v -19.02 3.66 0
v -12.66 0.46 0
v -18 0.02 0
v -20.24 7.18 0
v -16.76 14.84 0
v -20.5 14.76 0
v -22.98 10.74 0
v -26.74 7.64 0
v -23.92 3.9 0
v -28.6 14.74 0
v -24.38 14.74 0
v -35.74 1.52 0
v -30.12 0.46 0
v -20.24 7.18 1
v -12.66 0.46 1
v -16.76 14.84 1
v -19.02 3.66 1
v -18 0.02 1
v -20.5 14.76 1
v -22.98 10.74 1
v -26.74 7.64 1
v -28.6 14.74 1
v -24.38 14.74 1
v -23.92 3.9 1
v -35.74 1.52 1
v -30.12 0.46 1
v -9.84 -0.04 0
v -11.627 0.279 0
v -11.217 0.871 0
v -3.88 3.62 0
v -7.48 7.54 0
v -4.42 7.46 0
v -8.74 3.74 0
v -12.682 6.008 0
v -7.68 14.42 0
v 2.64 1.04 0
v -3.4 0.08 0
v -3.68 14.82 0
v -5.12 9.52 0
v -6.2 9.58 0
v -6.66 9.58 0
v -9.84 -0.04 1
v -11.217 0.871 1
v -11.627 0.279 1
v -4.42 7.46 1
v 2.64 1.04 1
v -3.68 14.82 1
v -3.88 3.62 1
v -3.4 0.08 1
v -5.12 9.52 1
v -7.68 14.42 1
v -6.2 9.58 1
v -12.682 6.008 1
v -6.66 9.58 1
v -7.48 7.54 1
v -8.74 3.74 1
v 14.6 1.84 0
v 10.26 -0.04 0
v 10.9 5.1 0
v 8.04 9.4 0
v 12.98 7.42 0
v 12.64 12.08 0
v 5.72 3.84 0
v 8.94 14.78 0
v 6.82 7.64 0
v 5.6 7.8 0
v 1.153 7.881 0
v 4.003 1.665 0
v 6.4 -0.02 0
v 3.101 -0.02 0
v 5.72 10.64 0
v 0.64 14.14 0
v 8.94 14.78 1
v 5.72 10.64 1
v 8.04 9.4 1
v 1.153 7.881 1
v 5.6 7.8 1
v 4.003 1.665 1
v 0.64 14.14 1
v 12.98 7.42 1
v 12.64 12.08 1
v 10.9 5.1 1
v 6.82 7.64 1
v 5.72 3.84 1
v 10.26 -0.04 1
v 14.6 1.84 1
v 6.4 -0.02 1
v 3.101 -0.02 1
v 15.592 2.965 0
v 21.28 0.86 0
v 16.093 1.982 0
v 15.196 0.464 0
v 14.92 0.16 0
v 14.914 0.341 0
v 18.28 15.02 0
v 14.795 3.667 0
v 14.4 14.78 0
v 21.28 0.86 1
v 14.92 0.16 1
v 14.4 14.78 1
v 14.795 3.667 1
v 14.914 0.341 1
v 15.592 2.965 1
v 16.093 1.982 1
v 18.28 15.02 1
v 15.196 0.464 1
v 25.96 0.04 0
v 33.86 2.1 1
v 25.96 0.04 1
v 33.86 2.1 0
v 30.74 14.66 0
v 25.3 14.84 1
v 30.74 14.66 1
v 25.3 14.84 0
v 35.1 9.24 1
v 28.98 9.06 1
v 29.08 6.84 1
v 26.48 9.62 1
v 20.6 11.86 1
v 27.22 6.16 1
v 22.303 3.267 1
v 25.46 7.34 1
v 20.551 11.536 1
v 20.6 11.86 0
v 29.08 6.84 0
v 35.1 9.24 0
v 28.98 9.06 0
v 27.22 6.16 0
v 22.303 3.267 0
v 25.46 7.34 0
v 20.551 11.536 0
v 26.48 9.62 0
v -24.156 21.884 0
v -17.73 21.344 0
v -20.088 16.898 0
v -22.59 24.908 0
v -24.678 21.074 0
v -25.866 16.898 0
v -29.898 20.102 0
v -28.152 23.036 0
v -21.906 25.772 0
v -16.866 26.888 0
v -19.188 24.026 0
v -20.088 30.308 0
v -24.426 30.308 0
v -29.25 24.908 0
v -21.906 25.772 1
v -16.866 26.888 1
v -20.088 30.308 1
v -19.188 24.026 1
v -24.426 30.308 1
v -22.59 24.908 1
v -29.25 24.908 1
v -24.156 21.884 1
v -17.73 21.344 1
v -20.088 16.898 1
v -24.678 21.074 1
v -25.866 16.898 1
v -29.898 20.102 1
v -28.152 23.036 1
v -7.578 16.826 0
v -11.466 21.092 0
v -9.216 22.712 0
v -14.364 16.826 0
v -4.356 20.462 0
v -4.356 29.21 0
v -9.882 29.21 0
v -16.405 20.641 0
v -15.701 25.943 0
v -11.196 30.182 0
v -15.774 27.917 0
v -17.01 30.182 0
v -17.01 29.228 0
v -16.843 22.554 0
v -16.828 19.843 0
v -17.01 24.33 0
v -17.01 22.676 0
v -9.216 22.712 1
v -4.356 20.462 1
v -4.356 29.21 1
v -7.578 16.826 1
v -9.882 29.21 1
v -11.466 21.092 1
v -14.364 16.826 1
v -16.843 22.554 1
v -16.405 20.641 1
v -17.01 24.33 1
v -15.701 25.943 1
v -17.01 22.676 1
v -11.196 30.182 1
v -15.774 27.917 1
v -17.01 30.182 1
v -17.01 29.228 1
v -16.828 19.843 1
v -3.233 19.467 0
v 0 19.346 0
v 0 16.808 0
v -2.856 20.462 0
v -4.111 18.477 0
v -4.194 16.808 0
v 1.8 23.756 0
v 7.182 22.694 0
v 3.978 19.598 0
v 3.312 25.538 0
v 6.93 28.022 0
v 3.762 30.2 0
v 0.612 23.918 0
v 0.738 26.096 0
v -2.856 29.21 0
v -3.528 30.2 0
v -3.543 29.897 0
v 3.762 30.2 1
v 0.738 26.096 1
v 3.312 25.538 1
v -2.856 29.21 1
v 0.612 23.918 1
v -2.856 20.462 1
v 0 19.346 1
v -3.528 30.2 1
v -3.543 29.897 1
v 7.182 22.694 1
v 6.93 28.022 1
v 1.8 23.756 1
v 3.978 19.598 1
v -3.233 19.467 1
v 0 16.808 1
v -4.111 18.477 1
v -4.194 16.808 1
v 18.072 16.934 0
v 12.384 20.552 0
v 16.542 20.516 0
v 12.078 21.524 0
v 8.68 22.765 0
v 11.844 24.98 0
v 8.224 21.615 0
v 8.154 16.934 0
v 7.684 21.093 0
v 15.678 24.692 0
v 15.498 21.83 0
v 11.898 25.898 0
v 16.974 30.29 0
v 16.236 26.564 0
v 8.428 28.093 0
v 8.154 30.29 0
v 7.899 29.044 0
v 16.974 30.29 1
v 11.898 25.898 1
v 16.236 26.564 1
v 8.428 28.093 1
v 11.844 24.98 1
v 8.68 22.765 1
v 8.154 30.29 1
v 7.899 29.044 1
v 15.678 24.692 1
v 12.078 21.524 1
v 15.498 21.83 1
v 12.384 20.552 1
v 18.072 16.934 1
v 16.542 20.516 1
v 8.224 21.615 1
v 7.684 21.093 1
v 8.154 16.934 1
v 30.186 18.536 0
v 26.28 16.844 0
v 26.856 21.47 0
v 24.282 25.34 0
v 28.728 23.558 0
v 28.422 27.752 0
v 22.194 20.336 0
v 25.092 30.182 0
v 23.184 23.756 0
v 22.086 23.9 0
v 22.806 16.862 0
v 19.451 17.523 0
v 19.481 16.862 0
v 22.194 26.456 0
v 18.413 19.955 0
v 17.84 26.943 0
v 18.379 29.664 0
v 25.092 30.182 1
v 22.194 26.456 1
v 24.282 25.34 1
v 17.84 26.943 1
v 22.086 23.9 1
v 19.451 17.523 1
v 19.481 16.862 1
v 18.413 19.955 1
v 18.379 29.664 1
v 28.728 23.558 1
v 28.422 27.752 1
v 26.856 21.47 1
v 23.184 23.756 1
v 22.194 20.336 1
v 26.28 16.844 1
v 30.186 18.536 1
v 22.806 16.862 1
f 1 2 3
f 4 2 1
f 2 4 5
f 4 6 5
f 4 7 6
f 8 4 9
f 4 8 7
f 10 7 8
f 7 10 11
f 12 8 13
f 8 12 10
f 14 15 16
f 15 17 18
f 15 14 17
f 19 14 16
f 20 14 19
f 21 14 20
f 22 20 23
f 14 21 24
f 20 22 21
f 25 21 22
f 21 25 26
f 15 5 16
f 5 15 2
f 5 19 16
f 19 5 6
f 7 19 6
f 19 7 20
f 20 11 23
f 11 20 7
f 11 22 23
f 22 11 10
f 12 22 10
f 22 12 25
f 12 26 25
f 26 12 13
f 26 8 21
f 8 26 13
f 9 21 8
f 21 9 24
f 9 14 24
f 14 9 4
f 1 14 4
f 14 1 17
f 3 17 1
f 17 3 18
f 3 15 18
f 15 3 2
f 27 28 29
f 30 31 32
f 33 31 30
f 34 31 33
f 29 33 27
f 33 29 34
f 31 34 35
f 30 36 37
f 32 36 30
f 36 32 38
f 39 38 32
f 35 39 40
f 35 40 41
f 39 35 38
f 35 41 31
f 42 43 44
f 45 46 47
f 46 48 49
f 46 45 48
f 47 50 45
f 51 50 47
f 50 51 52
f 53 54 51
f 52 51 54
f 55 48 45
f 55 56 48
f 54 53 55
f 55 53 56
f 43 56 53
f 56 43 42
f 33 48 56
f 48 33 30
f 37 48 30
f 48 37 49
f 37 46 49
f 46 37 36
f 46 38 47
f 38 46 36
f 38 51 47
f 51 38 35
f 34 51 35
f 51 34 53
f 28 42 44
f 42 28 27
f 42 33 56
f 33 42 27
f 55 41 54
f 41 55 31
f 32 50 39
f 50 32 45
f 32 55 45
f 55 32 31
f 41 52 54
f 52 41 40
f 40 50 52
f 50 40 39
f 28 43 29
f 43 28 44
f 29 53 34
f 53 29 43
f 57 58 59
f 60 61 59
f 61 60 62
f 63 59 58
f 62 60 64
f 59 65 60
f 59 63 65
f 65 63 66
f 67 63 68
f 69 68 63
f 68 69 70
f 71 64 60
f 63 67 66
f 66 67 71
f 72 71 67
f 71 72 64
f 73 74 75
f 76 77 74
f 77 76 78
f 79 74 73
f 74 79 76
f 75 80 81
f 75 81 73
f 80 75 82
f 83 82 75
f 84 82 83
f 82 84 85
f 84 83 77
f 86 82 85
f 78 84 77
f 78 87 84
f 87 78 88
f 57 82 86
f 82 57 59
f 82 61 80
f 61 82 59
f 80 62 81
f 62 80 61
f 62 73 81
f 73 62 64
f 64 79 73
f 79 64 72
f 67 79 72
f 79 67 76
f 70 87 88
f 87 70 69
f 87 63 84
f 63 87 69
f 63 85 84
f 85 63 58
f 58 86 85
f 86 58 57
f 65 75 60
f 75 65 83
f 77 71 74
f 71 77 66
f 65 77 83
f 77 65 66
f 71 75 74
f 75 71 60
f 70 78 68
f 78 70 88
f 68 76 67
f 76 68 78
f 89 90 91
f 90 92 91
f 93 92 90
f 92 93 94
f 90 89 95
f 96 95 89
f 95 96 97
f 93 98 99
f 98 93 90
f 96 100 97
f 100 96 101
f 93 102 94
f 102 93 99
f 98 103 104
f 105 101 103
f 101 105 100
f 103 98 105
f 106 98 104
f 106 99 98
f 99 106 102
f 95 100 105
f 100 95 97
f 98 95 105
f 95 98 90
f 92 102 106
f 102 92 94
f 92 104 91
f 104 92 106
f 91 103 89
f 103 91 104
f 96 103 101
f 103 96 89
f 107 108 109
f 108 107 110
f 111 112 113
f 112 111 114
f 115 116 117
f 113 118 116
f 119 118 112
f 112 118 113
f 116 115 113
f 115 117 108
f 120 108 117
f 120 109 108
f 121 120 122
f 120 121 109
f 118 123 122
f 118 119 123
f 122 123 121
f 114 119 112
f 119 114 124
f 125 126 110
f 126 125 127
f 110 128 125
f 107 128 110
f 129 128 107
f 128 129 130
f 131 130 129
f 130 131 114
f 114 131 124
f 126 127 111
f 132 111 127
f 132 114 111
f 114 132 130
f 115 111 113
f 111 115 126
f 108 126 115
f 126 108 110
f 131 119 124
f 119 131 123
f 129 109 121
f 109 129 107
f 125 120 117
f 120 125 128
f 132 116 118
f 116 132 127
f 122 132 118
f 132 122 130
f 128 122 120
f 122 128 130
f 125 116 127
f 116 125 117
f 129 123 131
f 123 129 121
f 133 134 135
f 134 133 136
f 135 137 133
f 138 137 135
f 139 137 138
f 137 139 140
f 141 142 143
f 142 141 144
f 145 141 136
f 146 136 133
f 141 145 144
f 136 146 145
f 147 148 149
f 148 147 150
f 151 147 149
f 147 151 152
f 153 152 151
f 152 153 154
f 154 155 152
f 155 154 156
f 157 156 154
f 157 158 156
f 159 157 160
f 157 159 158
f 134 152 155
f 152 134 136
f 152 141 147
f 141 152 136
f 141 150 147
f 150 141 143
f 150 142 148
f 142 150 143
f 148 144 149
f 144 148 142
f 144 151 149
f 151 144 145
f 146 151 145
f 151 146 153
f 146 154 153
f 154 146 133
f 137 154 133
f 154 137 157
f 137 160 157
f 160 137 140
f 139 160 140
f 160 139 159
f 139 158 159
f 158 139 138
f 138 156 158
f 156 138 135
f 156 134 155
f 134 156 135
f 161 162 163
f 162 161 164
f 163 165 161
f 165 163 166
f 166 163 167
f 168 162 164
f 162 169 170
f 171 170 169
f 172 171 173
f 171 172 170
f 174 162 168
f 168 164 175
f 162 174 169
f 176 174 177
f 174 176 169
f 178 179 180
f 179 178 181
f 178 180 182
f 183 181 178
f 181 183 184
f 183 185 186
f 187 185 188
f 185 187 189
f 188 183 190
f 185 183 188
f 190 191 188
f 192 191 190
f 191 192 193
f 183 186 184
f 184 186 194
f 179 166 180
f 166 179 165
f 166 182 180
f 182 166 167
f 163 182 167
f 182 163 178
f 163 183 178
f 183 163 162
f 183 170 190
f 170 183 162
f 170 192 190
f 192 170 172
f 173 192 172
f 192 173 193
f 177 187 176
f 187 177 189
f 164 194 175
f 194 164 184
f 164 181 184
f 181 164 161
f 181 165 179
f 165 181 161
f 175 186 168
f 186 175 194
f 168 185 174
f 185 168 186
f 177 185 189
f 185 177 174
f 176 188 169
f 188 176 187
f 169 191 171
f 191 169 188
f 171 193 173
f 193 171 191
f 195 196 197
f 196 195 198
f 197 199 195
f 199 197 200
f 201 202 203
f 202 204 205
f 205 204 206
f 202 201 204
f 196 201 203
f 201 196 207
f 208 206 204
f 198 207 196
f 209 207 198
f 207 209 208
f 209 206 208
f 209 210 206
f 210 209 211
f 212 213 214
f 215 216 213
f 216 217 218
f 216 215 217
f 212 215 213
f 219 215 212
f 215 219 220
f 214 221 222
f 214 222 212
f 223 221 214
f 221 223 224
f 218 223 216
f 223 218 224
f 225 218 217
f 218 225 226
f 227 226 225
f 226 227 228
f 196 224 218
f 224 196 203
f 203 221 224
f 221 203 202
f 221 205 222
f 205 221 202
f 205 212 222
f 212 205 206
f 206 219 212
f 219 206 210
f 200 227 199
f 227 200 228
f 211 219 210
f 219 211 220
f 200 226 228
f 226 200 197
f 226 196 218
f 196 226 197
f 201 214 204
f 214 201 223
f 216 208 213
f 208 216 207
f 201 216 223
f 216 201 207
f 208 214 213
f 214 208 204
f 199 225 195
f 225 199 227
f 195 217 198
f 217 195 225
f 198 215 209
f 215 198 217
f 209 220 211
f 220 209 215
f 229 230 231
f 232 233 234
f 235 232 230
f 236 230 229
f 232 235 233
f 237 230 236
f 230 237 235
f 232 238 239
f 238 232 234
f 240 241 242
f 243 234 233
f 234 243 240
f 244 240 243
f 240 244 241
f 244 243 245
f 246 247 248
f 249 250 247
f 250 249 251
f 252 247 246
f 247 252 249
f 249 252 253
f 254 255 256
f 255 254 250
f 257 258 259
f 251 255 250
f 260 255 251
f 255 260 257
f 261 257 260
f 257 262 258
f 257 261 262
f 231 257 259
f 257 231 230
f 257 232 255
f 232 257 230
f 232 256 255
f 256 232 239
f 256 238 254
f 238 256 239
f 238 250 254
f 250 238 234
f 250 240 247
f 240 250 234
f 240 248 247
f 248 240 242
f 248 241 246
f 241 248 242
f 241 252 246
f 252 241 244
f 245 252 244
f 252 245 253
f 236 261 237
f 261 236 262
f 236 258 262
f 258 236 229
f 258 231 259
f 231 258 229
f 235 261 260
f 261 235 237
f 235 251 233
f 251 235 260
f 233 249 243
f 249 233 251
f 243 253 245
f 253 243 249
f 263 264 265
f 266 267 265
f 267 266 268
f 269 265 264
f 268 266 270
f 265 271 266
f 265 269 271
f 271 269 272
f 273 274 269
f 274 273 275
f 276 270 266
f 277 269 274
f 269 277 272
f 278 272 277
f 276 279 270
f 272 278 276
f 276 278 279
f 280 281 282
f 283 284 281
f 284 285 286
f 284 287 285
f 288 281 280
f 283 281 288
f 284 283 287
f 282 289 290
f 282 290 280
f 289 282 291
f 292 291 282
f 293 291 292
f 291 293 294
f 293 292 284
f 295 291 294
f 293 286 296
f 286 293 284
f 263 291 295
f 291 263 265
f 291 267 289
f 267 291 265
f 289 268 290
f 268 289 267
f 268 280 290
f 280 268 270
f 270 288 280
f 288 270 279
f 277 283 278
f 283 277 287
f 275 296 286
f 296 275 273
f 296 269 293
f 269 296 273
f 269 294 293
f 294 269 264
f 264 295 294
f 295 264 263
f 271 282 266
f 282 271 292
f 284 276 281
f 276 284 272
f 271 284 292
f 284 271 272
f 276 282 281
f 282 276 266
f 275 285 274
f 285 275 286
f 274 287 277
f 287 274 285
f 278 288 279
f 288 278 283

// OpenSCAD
// Choose your custom words and write them in UPPERCASE.
// If you want only one line, you can leave the second word empty.
word1="SUPER";
word2="MARIO";

// CONSTANTS
// The following values are model constants and are not intended to be changed by the end user.
//-----------------
// [Fixed design parameters]
// Scale for Word 1
scale_word1 = 1.8;

// Scale for Word 2
scale_word2 = 2.0;
// Height scale
scale_height = 1;

// Brim radius/offset
brim_radius = 1.5;

// Gap between the two words
gap = 2;
// Spaziatura tra le lettere
spacing = 0.0;


// Small tolerance to help letters fit into the brim
wiggle=0.1;
//-----------------


// Wall thickness for hollow letters
wall_thikness_letter = 2;

//-----------------

// Path data for letters and symbols
glyph_A = [
    [449, 741], [765, 52], [463, 4], [439, 181], [196, 187], [141, -2], [-150, 50], [249, 721], [449, 741]
]/100;
glyph_B = [
    [138, 747], [485, 706], [565, 578], [559, 441], [507, 363], [580, 321], [629, 178], [573, 45], [457, 4], [21, 1], [1, 704], [138, 747]
]/100;
glyph_C = [
    [287, 744], [563, 726], [552, 461], [372, 545], [215, 472], [208, 302], [346, 208], [549, 314], [617, 35], [218, 0], [23, 171], [-35, 386], [55, 617], [287, 744]
]/100;
glyph_D = [
    [368, 744], [578, 572], [621, 171], [414, 2], [0, 2], [0, 699], [368, 744]
]/100;
glyph_E = [
    [54, 745], [544, 745], [503, 538], [262, 501], [259, 450], [472, 434], 
    [462, 275], [272, 258], [289, 204], [520, 202], [605, 3], [54, 3], 
    [0, 481], [54, 745]
]/100;
glyph_F = [
    [49, 746], [553, 742], [525, 501], [250, 532], [246, 452], [479, 464], [441, 244], [246, 269], [288, 3], [22, 3], [1, 543], [49, 746]
]/100;
glyph_G = [
    [627, 591], [456, 495], [387, 533], [285, 502], [224, 357], [288, 222], [472, 244], [476, 277], [334, 264], [352, 465], [648, 461], [648, 66], [151, 2], [0, 309], [55, 591], [267, 745], [527, 727], [627, 591]
]/100;
glyph_H = [
    [0, 698], [252, 746], [264, 441], [411, 463], [420, 732], [626, 723], [666, 5], [434, 13], [432, 238], [292, 211], [297, 5], [80, 5],
    [0, 698]
]/100;
glyph_I = [
    [5, 739], [199, 751], [349, 43], [31, 8], [5, 739]
]/100;
glyph_J = [
    [0, 739], [219, 744], [658, 724], [658, 528], [459, 509],
    [533, 162], [430, 32], [235, 0], [18, 0], [25, 220],
    [263, 237], [236, 509], [0, 528], [0, 739]
]/100;
glyph_K = [
    [14, 741], [223, 741], [218, 539], [375, 718], [518, 566],
    [337, 369], [605, 178], [440, 0], [216, 243], [257, -2],
    [0, -2], [14, 741]
]/100;
glyph_L = [
    [278, 717], [249, 269], [556, 306], [584, 75], [28, 9],
    [0, 749], [278, 717]
]/100;
glyph_M = [
    [0, 76], [357, 737], [568, 737], [638, 537], [762, 738],
    [949, 742], [1154, 23], [887, 1], [836, 183], [775, 359],
    [591, 195], [450, 382], [281, 23], [0, 76]
]/100;
glyph_N = [
    [0, 13], [133, 742], [284, 742], [425, 510], [437, 742],
    [669, 706], [620, 4], [428, 16], [280, 242], [237, 3],
    [0, 13]
]/100;
glyph_O = [
    [522, 733], [740, 462], [678, 105], [283, 2], [-32, 280],
    [15, 593], [250, 742], [522, 733]
]/100;
glyph_P = [
    [442, 740], [618, 619], [632, 323], [454, 151], [233, 137], [233, -4], [0, -4], [37, 740], [442, 740]
]/100;
glyph_Q =[
    [531, 731], [721, 478], [653, 216], [797, 84], [621, -2], [535, 61], [238, -3], [-21, 243], [26, 593], [260, 740], [531, 731]
]/100;
glyph_R = [
    [415, 739], [600, 604], [617, 371], [513, 255], [698, 92], [481, -2], [254, 192], [288, -1], [58, -1], [0, 707], [415, 739]
]/100;
glyph_S = [
    [725, 556], [596, 397], [445, 494], [407, 446], [677, 248], [546, 1], [225, 1], [1, 179], [98, 342], [291, 233],
    [320, 278], [37, 446], [305, 746], [546, 746], [725, 556]
]/100;
glyph_T = [
    [0, 742], [739, 729], [739, 429], [489, 470], [558, -1], [200, -1], [254, 470], [0, 483], [0, 742]
]/100;
glyph_U = [
    [-9, 739], [314, 739], [299, 234], [424, 324], [387, 685], [694, 685], [694, 199], [515, -3], [138, -3], [-9, 177], [-9, 739]
]/100;
glyph_V = [
    [0, 745], [259, 731], [362, 284], [401, 334], [512, 731], [799, 745], [517, 3], [169, 29], [0, 745]
]/100;
glyph_W = [
    [1028, 675], [709, 6], [523, 6], [454, 207], [352, 5], [182, 0], [0, 723], [238, 744], [283, 562], [337, 385], [502, 550], [627, 362], [778, 729], [1028, 675]
]/100;
glyph_X = [
    [200, 739], [357, 579], [473, 750], [663, 568], [525, 405], [753, 226], [563, 7], [399, 221], [191, 12], [0, 201], [221, 400], [53, 588], [200, 739]
]/100;
glyph_Y = [
    [71, 733], [236, 557], [391, 753], [610, 588], [371, 380], [548, 13], [156, 31], [156, 350], [-93, 588], [71, 733]
]/100;
glyph_Z = [
    [617, 3], [0, 28], [0, 228], [248, 486], [0, 471], [44, 748], [625, 707], [614, 517], [386, 265], [625, 300], [617, 3]
]/100;
glyph_0 = [
    [381, 732], [552, 531], [497, 90], [224, 1], [3, 223], [48, 606], [202, 742], [381, 732], [560, 732]
]/100;
glyph_1 = [
    [527, 727], [468, 205], [679, 232], [713, 1], [0, 1], [20, 218], [258, 205], [258, 476], [133, 397], [0, 578], [269, 741], [527, 741]
]/100;
glyph_2 = [
    [4, 605], [211, 742], [392, 741], [544, 629], [610, 352], [411, 221], [629, 239], [686, 1], [110, 9], [34, 156], [330, 390], [309, 454], [261, 492], [140, 409], [4, 605]
]/100;
glyph_3 = [
    [1, 607], [178, 740], [403, 708], [511, 522], [441, 421], [528, 357], [534, 131], [415, 1], [148, 26], [1, 175], [120, 291], [220, 197], [314, 222], [317, 279], [170, 329], [176, 419], [295, 498], [264, 531], [97, 454], [1, 607]
]/100;
glyph_4 = [
    [531, 409], [689, 402], [689, 223], [548, 214], [575, 31], [318, 4], [314, 214], [8, 214], [4, 400], [208, 747], [487, 728], [531, 409]
]/100;
glyph_5 = [
    [572, 741], [530, 543], [247, 546], [253, 501], [415, 495], [610, 389], [609, 166], [534, 45], [189, 10], [7, 95], [88, 248], [212, 205], [324, 200], [368, 251], [318, 298], [91, 293], [10, 433], [0, 724], [572, 741]
]/100;
glyph_6 = [
    [154, 719], [335, 746], [515, 709], [447, 499], [286, 559], [211, 500], [202, 444], [416, 438], [501, 300], [499, 120], [380, 1], [136, 1], [0, 120], [0, 371], [28, 575], [154, 719]
]/100;
glyph_7 = [
    [0, 740], [641, 726], [524, -3], [234, 66], [393, 501], [51, 473], [0, 740]
]/100;
glyph_8 = [
    [461, 716], [533, 519], [446, 450], [562, 355], [577, 61], [414, -3], [154, -3], [0, 87], [17, 351], [139, 444], [46, 519], [116, 745], [461, 716]
]/100;
glyph_9 = [
    [306, 747], [533, 593], [524, 320], [447, 127], [116, 1], [0, 161], [264, 230], [319, 327], [137, 313], [0, 463], [36, 677], [306, 747]
]/100;
glyph_at = [
    [422, 103], [606, 184], [657, 125], [441, 2], [160, 63], [3, 349], [116, 715], [381, 854], [786, 684], [869, 344], [800, 248], [744, 167], [636, 182], [594, 233], [461, 169], [234, 206], [183, 482], [323, 672], [510, 664], [596, 607], [599, 637], [670, 600], [653, 418], [677, 260], [722, 243], [783, 364], [710, 615], [385, 748], [197, 637], [119, 371], [212, 165], [422, 103]
]/100;
glyph_b_l = [
    [233, 856], [241, 782], [89, 795], [84, -15], [241, 15], [241, -83], [7, -98], [2, 866], [233, 856]
]/100;
glyph_b_r = [
    [9, -88], [1, -14], [153, -27], [158, 783], [1, 753], [1, 851], [235, 866], [240, -98], [9, -88]
]/100;
glyph_per = [
    [389, 745], [572, 774], [206, 33], [0, 4], [389, 745], [475, 293], [544, 213], [522, 35], [412, 0], [324, 88], [342, 242], [404, 297], [475, 293], [389, 745], [191, 768], [260, 687], [238, 510], [128, 474], [38, 564], [57, 717], [119, 771], [191, 768], [389, 745]
]/100;
glyph_num = [
    [395, 778], [292, 29], [156, 0], [274, 749], [395, 778],
    
    [544, 749], [665, 778], [563, 29], [426, 0], [544, 749], 
    
   [718, 601], [810, 451], [113, 429], [4, 594], [718, 601],  
    
    [733, 328], [832, 169], [135, 147], [60, 316], [733, 328], [718, 601], [544, 749], [395, 778]
]/100;
glyph_dol = [
    [664, 550], [546, 405], [431, 528], [289, 576], [254, 531], [664, 256], [500, 42], [206, 42], [1, 205], [90, 354], [259, 208], [444, 163], [471, 204], [34, 450], [279, 724], [500, 724], 
    [424, 794], [341, 795], [283, -32], [399, -20], [424, 794], [500, 724]
]/100;
glyph_asc = [
    [278, 582], [164, 765], [68, 601], [8, 638], [164, 882], [348, 593], [278, 582]
]/100;
glyph_bar = [
    [60, -121], [5, -121], [3, 853], [58, 853], [60, 974], [115, 974], [60, -121]
]/100;
glyph_ast = [
    [67, 719], [97, 720], [93, 653], [144, 696], [158, 662], [99, 638], [161, 608], [141, 585], [93, 620], [99, 558], [49, 561], [55, 620], [22, 617], [28, 676], [78, 640], [28, 699], [95, 673], [95, 730], [45, 694], [23, 722], [90, 748], [38, 784], [67, 719]
]/100;
glyph_col = [
    [92, 179], [164, 144], [172, 49], [114, 8], [50, 20], [20, 52], [10, 136], [92, 179], [97, 320], [170, 386], [167, 456], [84, 503], [16, 463], [22, 362], [97, 320]
]/100;
//glyph_scol = [
    //[72, 456], [139, 496], [220, 450], [223, 381], [154, 317], [81, 358], [89, 95], [164, 91], [142, -17], [61, -92], [11, -92], [80, 5]
//]/100;
glyph_dot = [
    [107, 173], [186, 173], [233, 91], [200, 30], [107, 9], [64, 82], [107, 173]
]/100;
glyph_sl = [
    [375, 727], [551, 755], [198, 41], [0, 13], [375, 727]
]/100;
glyph_add = [
    [222, 524], [220, 424], [323, 434], [336, 320], [220, 325], [233, 221], [125, 213], [116, 325], [15, 328], [-2, 423], [119, 423], [108, 529], [222, 524]
]/100;
glyph_com = [
    [58, 81], [138, 76], [114, -39], [28, -119], [-25, -119], [48, -15], [58, 81]
]/100;
glyph_dif = [
    [6, 342], [1, 431], [325, 471], [341, 354], [6, 342]
]/100;
glyph_equ = [
    [5, 299], [0, 353], [305, 377], [320, 307], [5, 299], [5, 435], [0, 488], [305, 512], [320, 442], [5, 435]
]/100;
glyph_que = [
    [242, 144], [298, 68], [263, 3], [174, 0], [138, 54], [162, 140], [242, 144],
    [256, 465], [284, 573], [226, 609], [138, 528], [0, 671], [131, 779], [308, 779], [437, 623], [432, 424], [293, 330], [308, 190], [126, 190], [105, 345], [256, 465], [242, 144]
]/100;
glyph_exc = [
    [213, 219], [93, 210], [0, 768], [197, 796], [213, 219],[71, 78], [106, 144], [197, 148], [233, 92], [209, 4], [128, 1], [71, 78]
]/100;
glyph_les = [
    [37, 785], [91, 776], [91, 665], [38, 593], [-3, 609], [38, 691], [205, 776], [205, 665], [152, 593], [99, 609], [140, 691], [139, 785],
    [205, 776], [205, 665], [152, 593], [99, 609], [140, 691], [139, 785]
]/100;
glyph_pr = [
    [0, 785], [71, 785], [175, 658], [251, 402], [240, 130], [200, 2], [80, -100], [33, -80], [120, 41], [150, 268], [119, 498], [0, 785]
]/100;
glyph_pl = [
    [250, 780], [132, 622], [67, 392], [92, 166], [218, -62], [130, -62], [80, 40], [20, 194], [0, 465], [76, 721], [120, 800], [220, 860], [354, 890], [354, 800]
]/100;
glyph_uns = [
    [0, -28], [0, 27], [728, 27], [728, -28], [0, -28]
]/100;
glyph_qus = [
    [37, 785], [91, 776], [91, 665], [38, 593], [-3, 609], [38, 691], [37, 785]
]/100;
// Path data for the holes in the letters and symbols
hole_A = [
    [300, 479], [259, 377], [412, 373], [377, 476], [323, 479]
]/100;
hole_B = [
    [257, 152], [359, 174], [359, 242], [257, 277], [257, 152], [244, 462], [345, 483], [345, 565], [244, 587], [244, 462]
]/100;
hole_D = [
    [229, 477], [229, 259], [364, 306], [364, 415], [229, 477]
]/100;
hole_O = [
    [309, 481], [258, 367], [346, 308], [439, 342], [434, 453], [309, 481]
]/100;
hole_P = [
    [274, 512], [267, 391], [333, 382], [417, 481], [274, 512]
]/100;
hole_Q = [
    [228, 477], [221, 272], [385, 223], [294, 313], [426, 409], [505, 336], [532, 388], [432, 523], [228, 477]
]/100;
hole_R = [
    [254, 532], [248, 390], [309, 382], [370, 470], [254, 532]
]/100;
hole_0 = [
    [257, 488], [235, 324], [279, 287], [327, 321], [318, 462], [257, 462]

]/100;
hole_4 = [
    [216, 409], [305, 409], [297, 513], [216, 409]
]/100;
hole_6 = [
    [258, 267], [211, 244], [213, 185], [292, 185], [308, 249], [258, 267]
]/100;
hole_8 = [
    [364, 259], [306, 283], [248, 259], [248, 211], [306, 187], [364, 211], [364, 259], [332, 587], [288, 605], [244, 587], [244, 551], [288, 533], [332, 551], [332, 587]
]/100;
hole_9 = [
    [225, 480], [312, 480], [321, 527], [281, 560], [225, 527], [225, 480]
]/100;
hole_at = [
    [381, 514], [336, 445], [365, 351], [451, 351], [508, 418], [479, 504], [381, 514]
]/100;
hole_per = [
    [426, 195], [417, 129], [435, 114], [454, 128], [451, 185], [426, 195],
    [141, 670], [132, 604], [149, 589], [169, 603], [165, 659], [141, 670]
]/100;
// Width of the letters
width = [765-100/*A*/, 629-1/*B*/, 617+35/*C*/, 621-0/*D*/, 605-25/*E*/, 553-1/*F*/, 648-0/*G*/, 666-0/*H*/, 350-50/*I*/, 658-0/*J*/, 540-0/*K*/, 584-0/*L*/, 1154-0/*M*/, 669-0/*N*/, 740+32/*O*/, 632-0/*P*/, 797+21/*Q*/, 698-15/*R*/, 725+1/*S*/, 739-0/*T*/, 694+9/*U*/, 799-0/*V*/, 1028-0/*W*/, 753-0/*X*/, 610+93/*Y*/, 625-0/*Z*/, 560-3/*0*/, 620/*1*/, 686-4/*2*/, 600/*3*/, 689-4/*4*/, 680/*5*/, 515/*6*/, 641/*7*/, 577/*8*/, 533/*9*/, 869/*@*/, 240/*[*/, 240/*]*/, 572/*%*/, 572/*#*/, 664/*$*/, 348/*^*/, 115/*|*/, 161/***/, 172+79/*:*/, 220/*;*/, 270/*.*/, 551/*/*/, 336/*+*/, 160/*,*/, 330/*-*/, 310/*=*/, 430/*?*/, 230/*!*/, 882/*<*/, 251/*)*/, 354/*(*/, 728/*_*/, 90/*'*/]/100;
width_A = width[0];
width_B = width[1];
width_C = width[2];
width_D = width[3];
width_E = width[4];
width_F = width[5];
width_G = width[6];
width_H = width[7];
width_I = width[8];
width_J = width[9];
width_K = width[10];
width_L = width[11];
width_M = width[12];
width_N = width[13];
width_O = width[14];
width_P = width[15];
width_Q = width[16];
width_R = width[17];
width_S = width[18];
width_T = width[19];
width_U = width[20];
width_V = width[21];
width_W = width[22];
width_X = width[23];
width_Y = width[24];
width_Z = width[25];
width_0 = width[26];
width_1 = width[27];
width_2 = width[28];
width_3 = width[29];
width_4 = width[30];
width_5 = width[31];
width_6 = width[32];
width_7 = width[33];
width_8 = width[34];
width_9 = width[35];
width_at = width[36];
width_b_l = width[37];
width_b_r = width[38];
width_per = width[39];
width_num = width[40];
width_dol = width[41];
width_asc = width[42];
width_bar = width[43];
width_ast = width[44];
width_col = width[45];
width_scol = width[46];
width_dot = width[47];
width_sl = width[48];
width_add = width[49];
width_com = width[50];
width_dif = width[51];
width_equ = width[52];
width_que = width[53];
width_exc = width[54];
width_les = width[55];
width_pr = width[56];
width_pl = width[57];
width_uns = width[58];
width_qus = width[59];
// Function that returns the path data for any supported letter or symbol
function glyph_sorter_all(letter) =
    letter == "A" ? (glyph_A) :
    letter == "B" ? (glyph_B) :
    letter == "C" ? (glyph_C) :
    letter == "D" ? (glyph_D) :
    letter == "E" ? (glyph_E) :
    letter == "F" ? (glyph_F) :
    letter == "G" ? (glyph_G) :
    letter == "H" ? (glyph_H) :
    letter == "I" ? (glyph_I) :
    letter == "J" ? (glyph_J) :
    letter == "K" ? (glyph_K) :
    letter == "L" ? (glyph_L) :
    letter == "M" ? (glyph_M) :
    letter == "N" ? (glyph_N) :
    letter == "O" ? (glyph_O) :
    letter == "P" ? (glyph_P) :
    letter == "Q" ? (glyph_Q) :
    letter == "R" ? (glyph_R) :
    letter == "S" ? (glyph_S) :
    letter == "T" ? (glyph_T) :
    letter == "U" ? (glyph_U) :
    letter == "V" ? (glyph_V) :
    letter == "W" ? (glyph_W) :
    letter == "X" ? (glyph_X) :
    letter == "Y" ? (glyph_Y) :
    letter == "Z" ? (glyph_Z) :
    letter == "0" ? (glyph_0) :
    letter == "1" ? (glyph_1) :
    letter == "2" ? (glyph_2) :
    letter == "3" ? (glyph_3) :
    letter == "4" ? (glyph_4) :
    letter == "5" ? (glyph_5) :
    letter == "6" ? (glyph_6) :
    letter == "7" ? (glyph_7) :
    letter == "8" ? (glyph_8) :
    letter == "9" ? (glyph_9) :
    letter == "@" ? (glyph_at) :
    letter == "[" ? (glyph_b_l) :
    letter == "]" ? (glyph_b_r) :
    letter == "%" ? (glyph_per) :
    letter == "#" ? (glyph_num) :
    letter == "$" ? (glyph_dol) :
    letter == "^" ? (glyph_asc) :
    letter == "|" ? (glyph_bar) :
    letter == "*" ? (glyph_ast) :
    letter == ":" ? (glyph_col) :
    letter == ";" ? (glyph_scol) :
    letter == "." ? (glyph_dot) :
    letter == "/" ? (glyph_sl) :
    letter == "+" ? (glyph_add) :
    letter == "," ? (glyph_com) :
    letter == "-" ? (glyph_dif) :
    letter == "=" ? (glyph_equ) :
    letter == "?" ? (glyph_que) :
    letter == "!" ? (glyph_exc) :
    letter == "<" ? (glyph_les) :
    letter == ")" ? (glyph_pr) :
    letter == "(" ? (glyph_pl) :
    letter == "_" ? (glyph_uns) :
    letter == "'" ? (glyph_qus) :
    0; // Default value for unsupported letters

// Function that returns the path data for a subset of letters/symbols (used for solid letters)
function glyph_sorter(letter) =
    letter == "C" ? (glyph_C) :
    letter == "E" ? (glyph_E) :
    letter == "F" ? (glyph_F) :
    letter == "G" ? (glyph_G) :
    letter == "H" ? (glyph_H) :
    letter == "I" ? (glyph_I) :
    letter == "J" ? (glyph_J) :
    letter == "K" ? (glyph_K) :
    letter == "L" ? (glyph_L) :
    letter == "M" ? (glyph_M) :
    letter == "N" ? (glyph_N) :
    letter == "S" ? (glyph_S) :
    letter == "T" ? (glyph_T) :
    letter == "U" ? (glyph_U) :
    letter == "V" ? (glyph_V) :
    letter == "W" ? (glyph_W) :
    letter == "X" ? (glyph_X) :
    letter == "Y" ? (glyph_Y) :
    letter == "Z" ? (glyph_Z) :
    letter == "1" ? (glyph_1) :
    letter == "2" ? (glyph_2) :
    letter == "3" ? (glyph_3) :
    letter == "5" ? (glyph_5) :
    letter == "7" ? (glyph_7) :
    letter == "[" ? (glyph_b_l) :
    letter == "]" ? (glyph_b_r) :
    letter == "#" ? (glyph_num) :
    letter == "$" ? (glyph_dol) :
    letter == "^" ? (glyph_asc) :
    letter == "|" ? (glyph_bar) :
    letter == "*" ? (glyph_ast) :
    letter == ":" ? (glyph_col) :
    letter == ";" ? (glyph_scol) :
    letter == "." ? (glyph_dot) :
    letter == "/" ? (glyph_sl) :
    letter == "+" ? (glyph_add) :
    letter == "," ? (glyph_com) :
    letter == "-" ? (glyph_dif) :
    letter == "=" ? (glyph_equ) :
    letter == "?" ? (glyph_que) :
    letter == "!" ? (glyph_exc) :
    letter == "<" ? (glyph_les) :
    letter == ")" ? (glyph_pr) :
    letter == "(" ? (glyph_pl) :
    letter == "_" ? (glyph_uns) :
    letter == "'" ? (glyph_qus) :
    0; // Default value for unsupported letters

// Function that returns the path data for letters with holes (used for hollow or outlined letters
function glyph_sorter_hole(letter) =
    letter == "A" ? (glyph_A) :
    letter == "B" ? (glyph_B) :
    letter == "D" ? (glyph_D) :
    letter == "O" ? (glyph_O) :
    letter == "P" ? (glyph_P) :
    letter == "Q" ? (glyph_Q) :
    letter == "R" ? (glyph_R) :
    letter == "0" ? (glyph_0) :
    letter == "4" ? (glyph_4) :
    letter == "6" ? (glyph_6) :
    letter == "8" ? (glyph_8) :
    letter == "9" ? (glyph_9) :
    letter == "@" ? (glyph_at) :
    letter == "%" ? (glyph_per) :
    0; // Default value for unsupported letters

// Function that returns the path data for the hole inside a letter (if present)
function hole_sorter(letter) =
    letter == "A" ? (hole_A) :
    letter == "B" ? (hole_B) :
    letter == "D" ? (hole_D) :
    letter == "O" ? (hole_O) :
    letter == "P" ? (hole_P) :
    letter == "Q" ? (hole_Q) :
    letter == "R" ? (hole_R) :
    letter == "0" ? (hole_0) :
    letter == "4" ? (hole_4) :
    letter == "6" ? (hole_6) :
    letter == "8" ? (hole_8) :
    letter == "9" ? (hole_9) :
    letter == "@" ? (hole_at) :
    letter == "%" ? (hole_per) :
    0;  // Default value for unsupported letters

// Function that returns the width of a letter or symbol, used for spacing
function width_letter(letter) =
    letter == "A" ? (width_A) :
    letter == "B" ? (width_B) :
    letter == "C" ? (width_C) :
    letter == "D" ? (width_D) :
    letter == "E" ? (width_E) :
    letter == "F" ? (width_F) :
    letter == "G" ? (width_G) :
    letter == "H" ? (width_H) :
    letter == "I" ? (width_I) :
    letter == "J" ? (width_J) :
    letter == "K" ? (width_K) :
    letter == "L" ? (width_L) :
    letter == "M" ? (width_M) :
    letter == "N" ? (width_N) :
    letter == "O" ? (width_O) :
    letter == "P" ? (width_P) :
    letter == "Q" ? (width_Q) :
    letter == "R" ? (width_R) :
    letter == "S" ? (width_S) :
    letter == "T" ? (width_T) :
    letter == "U" ? (width_U) :
    letter == "V" ? (width_V) :
    letter == "W" ? (width_W) :
    letter == "X" ? (width_X) :
    letter == "Y" ? (width_Y) :
    letter == "Z" ? (width_Z) :
    letter == "0" ? (width_0) :
    letter == "1" ? (width_1) :
    letter == "2" ? (width_2) :
    letter == "3" ? (width_3) :
    letter == "4" ? (width_4) :
    letter == "5" ? (width_5) :
    letter == "6" ? (width_6) :
    letter == "7" ? (width_7) :
    letter == "8" ? (width_8) :
    letter == "9" ? (width_9) :
    letter == "@" ? (width_at) :
    letter == "[" ? (width_b_l) :
    letter == "]" ? (width_b_r) :
    letter == "%" ? (width_per) :
    letter == "#" ? (width_num) :
    letter == "$" ? (width_dol) :
    letter == "^" ? (width_asc) :
    letter == "|" ? (width_bar) :
    letter == "*" ? (width_ast) :
    letter == ":" ? (width_col) :
    letter == ";" ? (width_scol) :
    letter == "." ? (width_dot) :
    letter == "/" ? (width_sl) :
    letter == "+" ? (width_add) :
    letter == "," ? (width_com) :
    letter == "-" ? (width_dif) :
    letter == "=" ? (width_equ) :
    letter == "?" ? (width_que) :
    letter == "!" ? (width_exc) :
    letter == "<" ? (width_les) :
    letter == ")" ? (glyph_pr) :
    letter == "(" ? (glyph_pl) :
    letter == "_" ? (glyph_uns) :
    letter == "'" ? (glyph_qus) :
    0; // Default value for unsupported letters

// Module that draws a glyph as a 2D polygon and extrudes it to the given height
module draw_glyph(paths, height=1)
{
    linear_extrude(height)
    polygon(paths); 
 

}

// Module that draws a glyph with a negative offset for hollow letters
module draw_glyph_smaller(paths, height=1)
{
    linear_extrude(height) offset(-wall_thikness_letter)
    polygon(paths);
}
// These Moduls are used to draw the brim around the letters, interlocking
// Module that draws the brim (outline) of a glyph with brim_radius
module draw_glyph_brim(paths, height=1)
{
     linear_extrude(height) offset(brim_radius) polygon(paths); // Dickerer Umriss am unteren Ende
}
// Module that draws a larger brim for hollow letters
module draw_glyph_brim_bigger(paths, height=1)
{
     linear_extrude(height) offset(brim_radius + wall_thikness_letter) polygon(paths); // Dickerer Umriss am unteren Ende
}

// Module that renders both words, positioning them correctly
module call_words(brim, k)
{   // Render the second word, centered horizontally
    translate([-total_width(word2, scale_word2) / 2, 0, 0])
    {
        render_word(word2, scale_height, scale_word2, k, brim);
    }
    // Render the first word, centered horizontally and shifted vertically
    translate([-total_width(word1, scale_word1) / 2, 7.44 * scale_word2 + gap, 0])
    {
        render_word(word1, scale_height, scale_word1, k, brim);
    }
}

// Module is necessary to renderer the letters to interlock them
// Module that renders a single letter with all options (brim, hollow, holes, etc.)
module render_letter(letter, height, i, pre_letter, scale, k, brim)
{
        // If the letter has a hole (A, B, D, O, P, Q, R, 0, 4, 6, 8, 9, @, %), draw the brim and the hole

        if(letter == "A"||"B"||"D"||"O"||"P"||"Q"||"R"||"0"||"4"||"6"||"8"||"9"||"@"||"%")
    {
        draw_glyph_brim(glyph_sorter_hole(letter)*scale, brim);
        difference()
        {
            draw_glyph(glyph_sorter_hole(letter)*scale, height);
            translate([0, 0, -1]) draw_glyph(hole_sorter(letter)*scale, height + 2);// Loch
            translate([-width_letter(pre_letter)*scale, 0, 0])draw_glyph_brim(glyph_sorter_all(pre_letter)*scale, height+2);
        }
    }
    // Draw the brim and the letter for all other cases

    draw_glyph_brim(glyph_sorter(letter)*scale,brim);
    difference()
    {
        draw_glyph(glyph_sorter(letter)*scale, height);
        translate([-width_letter(pre_letter)*scale-spacing, 0, 0])draw_glyph_brim(glyph_sorter_all(pre_letter)*scale, height+2);
    }

}



// Module that renders a word, letter by letter, with correct spacing
module render_word(word, height=1, scale, k, brim)
{ 
    // Loop through each letter in the word and render it with the correct spacing

    for (i = [0 : len(word) - 1])
    {
        translate([spacing_letter(i, str(word[i]), word, scale), 0, 0])
        {
            render_letter(str(word[i]), height, i, i == 0 ? "" : str(word[i-1]), scale, k, brim);
        }
    }
}

// Function that calculates the X offset for each letter in a word

function spacing_letter(i, letter, word, scale)
= i == 0 ? 0 : spacing_letter(i-1, str(word[i-1]), word, scale) + width_letter(str(word[i-1])) * scale + spacing;

// Function that calculates the total width of a word
function total_width(word, scale) = spacing_letter(len(word)-1, str(word[len(word)-1]), word, scale) + width_letter(str(word[len(word)-1])) * scale;

// Main module to render both words
module letters_main() 
{
    // Call the words with the specified parameters
    call_words(0, false);

}

letters_main();
